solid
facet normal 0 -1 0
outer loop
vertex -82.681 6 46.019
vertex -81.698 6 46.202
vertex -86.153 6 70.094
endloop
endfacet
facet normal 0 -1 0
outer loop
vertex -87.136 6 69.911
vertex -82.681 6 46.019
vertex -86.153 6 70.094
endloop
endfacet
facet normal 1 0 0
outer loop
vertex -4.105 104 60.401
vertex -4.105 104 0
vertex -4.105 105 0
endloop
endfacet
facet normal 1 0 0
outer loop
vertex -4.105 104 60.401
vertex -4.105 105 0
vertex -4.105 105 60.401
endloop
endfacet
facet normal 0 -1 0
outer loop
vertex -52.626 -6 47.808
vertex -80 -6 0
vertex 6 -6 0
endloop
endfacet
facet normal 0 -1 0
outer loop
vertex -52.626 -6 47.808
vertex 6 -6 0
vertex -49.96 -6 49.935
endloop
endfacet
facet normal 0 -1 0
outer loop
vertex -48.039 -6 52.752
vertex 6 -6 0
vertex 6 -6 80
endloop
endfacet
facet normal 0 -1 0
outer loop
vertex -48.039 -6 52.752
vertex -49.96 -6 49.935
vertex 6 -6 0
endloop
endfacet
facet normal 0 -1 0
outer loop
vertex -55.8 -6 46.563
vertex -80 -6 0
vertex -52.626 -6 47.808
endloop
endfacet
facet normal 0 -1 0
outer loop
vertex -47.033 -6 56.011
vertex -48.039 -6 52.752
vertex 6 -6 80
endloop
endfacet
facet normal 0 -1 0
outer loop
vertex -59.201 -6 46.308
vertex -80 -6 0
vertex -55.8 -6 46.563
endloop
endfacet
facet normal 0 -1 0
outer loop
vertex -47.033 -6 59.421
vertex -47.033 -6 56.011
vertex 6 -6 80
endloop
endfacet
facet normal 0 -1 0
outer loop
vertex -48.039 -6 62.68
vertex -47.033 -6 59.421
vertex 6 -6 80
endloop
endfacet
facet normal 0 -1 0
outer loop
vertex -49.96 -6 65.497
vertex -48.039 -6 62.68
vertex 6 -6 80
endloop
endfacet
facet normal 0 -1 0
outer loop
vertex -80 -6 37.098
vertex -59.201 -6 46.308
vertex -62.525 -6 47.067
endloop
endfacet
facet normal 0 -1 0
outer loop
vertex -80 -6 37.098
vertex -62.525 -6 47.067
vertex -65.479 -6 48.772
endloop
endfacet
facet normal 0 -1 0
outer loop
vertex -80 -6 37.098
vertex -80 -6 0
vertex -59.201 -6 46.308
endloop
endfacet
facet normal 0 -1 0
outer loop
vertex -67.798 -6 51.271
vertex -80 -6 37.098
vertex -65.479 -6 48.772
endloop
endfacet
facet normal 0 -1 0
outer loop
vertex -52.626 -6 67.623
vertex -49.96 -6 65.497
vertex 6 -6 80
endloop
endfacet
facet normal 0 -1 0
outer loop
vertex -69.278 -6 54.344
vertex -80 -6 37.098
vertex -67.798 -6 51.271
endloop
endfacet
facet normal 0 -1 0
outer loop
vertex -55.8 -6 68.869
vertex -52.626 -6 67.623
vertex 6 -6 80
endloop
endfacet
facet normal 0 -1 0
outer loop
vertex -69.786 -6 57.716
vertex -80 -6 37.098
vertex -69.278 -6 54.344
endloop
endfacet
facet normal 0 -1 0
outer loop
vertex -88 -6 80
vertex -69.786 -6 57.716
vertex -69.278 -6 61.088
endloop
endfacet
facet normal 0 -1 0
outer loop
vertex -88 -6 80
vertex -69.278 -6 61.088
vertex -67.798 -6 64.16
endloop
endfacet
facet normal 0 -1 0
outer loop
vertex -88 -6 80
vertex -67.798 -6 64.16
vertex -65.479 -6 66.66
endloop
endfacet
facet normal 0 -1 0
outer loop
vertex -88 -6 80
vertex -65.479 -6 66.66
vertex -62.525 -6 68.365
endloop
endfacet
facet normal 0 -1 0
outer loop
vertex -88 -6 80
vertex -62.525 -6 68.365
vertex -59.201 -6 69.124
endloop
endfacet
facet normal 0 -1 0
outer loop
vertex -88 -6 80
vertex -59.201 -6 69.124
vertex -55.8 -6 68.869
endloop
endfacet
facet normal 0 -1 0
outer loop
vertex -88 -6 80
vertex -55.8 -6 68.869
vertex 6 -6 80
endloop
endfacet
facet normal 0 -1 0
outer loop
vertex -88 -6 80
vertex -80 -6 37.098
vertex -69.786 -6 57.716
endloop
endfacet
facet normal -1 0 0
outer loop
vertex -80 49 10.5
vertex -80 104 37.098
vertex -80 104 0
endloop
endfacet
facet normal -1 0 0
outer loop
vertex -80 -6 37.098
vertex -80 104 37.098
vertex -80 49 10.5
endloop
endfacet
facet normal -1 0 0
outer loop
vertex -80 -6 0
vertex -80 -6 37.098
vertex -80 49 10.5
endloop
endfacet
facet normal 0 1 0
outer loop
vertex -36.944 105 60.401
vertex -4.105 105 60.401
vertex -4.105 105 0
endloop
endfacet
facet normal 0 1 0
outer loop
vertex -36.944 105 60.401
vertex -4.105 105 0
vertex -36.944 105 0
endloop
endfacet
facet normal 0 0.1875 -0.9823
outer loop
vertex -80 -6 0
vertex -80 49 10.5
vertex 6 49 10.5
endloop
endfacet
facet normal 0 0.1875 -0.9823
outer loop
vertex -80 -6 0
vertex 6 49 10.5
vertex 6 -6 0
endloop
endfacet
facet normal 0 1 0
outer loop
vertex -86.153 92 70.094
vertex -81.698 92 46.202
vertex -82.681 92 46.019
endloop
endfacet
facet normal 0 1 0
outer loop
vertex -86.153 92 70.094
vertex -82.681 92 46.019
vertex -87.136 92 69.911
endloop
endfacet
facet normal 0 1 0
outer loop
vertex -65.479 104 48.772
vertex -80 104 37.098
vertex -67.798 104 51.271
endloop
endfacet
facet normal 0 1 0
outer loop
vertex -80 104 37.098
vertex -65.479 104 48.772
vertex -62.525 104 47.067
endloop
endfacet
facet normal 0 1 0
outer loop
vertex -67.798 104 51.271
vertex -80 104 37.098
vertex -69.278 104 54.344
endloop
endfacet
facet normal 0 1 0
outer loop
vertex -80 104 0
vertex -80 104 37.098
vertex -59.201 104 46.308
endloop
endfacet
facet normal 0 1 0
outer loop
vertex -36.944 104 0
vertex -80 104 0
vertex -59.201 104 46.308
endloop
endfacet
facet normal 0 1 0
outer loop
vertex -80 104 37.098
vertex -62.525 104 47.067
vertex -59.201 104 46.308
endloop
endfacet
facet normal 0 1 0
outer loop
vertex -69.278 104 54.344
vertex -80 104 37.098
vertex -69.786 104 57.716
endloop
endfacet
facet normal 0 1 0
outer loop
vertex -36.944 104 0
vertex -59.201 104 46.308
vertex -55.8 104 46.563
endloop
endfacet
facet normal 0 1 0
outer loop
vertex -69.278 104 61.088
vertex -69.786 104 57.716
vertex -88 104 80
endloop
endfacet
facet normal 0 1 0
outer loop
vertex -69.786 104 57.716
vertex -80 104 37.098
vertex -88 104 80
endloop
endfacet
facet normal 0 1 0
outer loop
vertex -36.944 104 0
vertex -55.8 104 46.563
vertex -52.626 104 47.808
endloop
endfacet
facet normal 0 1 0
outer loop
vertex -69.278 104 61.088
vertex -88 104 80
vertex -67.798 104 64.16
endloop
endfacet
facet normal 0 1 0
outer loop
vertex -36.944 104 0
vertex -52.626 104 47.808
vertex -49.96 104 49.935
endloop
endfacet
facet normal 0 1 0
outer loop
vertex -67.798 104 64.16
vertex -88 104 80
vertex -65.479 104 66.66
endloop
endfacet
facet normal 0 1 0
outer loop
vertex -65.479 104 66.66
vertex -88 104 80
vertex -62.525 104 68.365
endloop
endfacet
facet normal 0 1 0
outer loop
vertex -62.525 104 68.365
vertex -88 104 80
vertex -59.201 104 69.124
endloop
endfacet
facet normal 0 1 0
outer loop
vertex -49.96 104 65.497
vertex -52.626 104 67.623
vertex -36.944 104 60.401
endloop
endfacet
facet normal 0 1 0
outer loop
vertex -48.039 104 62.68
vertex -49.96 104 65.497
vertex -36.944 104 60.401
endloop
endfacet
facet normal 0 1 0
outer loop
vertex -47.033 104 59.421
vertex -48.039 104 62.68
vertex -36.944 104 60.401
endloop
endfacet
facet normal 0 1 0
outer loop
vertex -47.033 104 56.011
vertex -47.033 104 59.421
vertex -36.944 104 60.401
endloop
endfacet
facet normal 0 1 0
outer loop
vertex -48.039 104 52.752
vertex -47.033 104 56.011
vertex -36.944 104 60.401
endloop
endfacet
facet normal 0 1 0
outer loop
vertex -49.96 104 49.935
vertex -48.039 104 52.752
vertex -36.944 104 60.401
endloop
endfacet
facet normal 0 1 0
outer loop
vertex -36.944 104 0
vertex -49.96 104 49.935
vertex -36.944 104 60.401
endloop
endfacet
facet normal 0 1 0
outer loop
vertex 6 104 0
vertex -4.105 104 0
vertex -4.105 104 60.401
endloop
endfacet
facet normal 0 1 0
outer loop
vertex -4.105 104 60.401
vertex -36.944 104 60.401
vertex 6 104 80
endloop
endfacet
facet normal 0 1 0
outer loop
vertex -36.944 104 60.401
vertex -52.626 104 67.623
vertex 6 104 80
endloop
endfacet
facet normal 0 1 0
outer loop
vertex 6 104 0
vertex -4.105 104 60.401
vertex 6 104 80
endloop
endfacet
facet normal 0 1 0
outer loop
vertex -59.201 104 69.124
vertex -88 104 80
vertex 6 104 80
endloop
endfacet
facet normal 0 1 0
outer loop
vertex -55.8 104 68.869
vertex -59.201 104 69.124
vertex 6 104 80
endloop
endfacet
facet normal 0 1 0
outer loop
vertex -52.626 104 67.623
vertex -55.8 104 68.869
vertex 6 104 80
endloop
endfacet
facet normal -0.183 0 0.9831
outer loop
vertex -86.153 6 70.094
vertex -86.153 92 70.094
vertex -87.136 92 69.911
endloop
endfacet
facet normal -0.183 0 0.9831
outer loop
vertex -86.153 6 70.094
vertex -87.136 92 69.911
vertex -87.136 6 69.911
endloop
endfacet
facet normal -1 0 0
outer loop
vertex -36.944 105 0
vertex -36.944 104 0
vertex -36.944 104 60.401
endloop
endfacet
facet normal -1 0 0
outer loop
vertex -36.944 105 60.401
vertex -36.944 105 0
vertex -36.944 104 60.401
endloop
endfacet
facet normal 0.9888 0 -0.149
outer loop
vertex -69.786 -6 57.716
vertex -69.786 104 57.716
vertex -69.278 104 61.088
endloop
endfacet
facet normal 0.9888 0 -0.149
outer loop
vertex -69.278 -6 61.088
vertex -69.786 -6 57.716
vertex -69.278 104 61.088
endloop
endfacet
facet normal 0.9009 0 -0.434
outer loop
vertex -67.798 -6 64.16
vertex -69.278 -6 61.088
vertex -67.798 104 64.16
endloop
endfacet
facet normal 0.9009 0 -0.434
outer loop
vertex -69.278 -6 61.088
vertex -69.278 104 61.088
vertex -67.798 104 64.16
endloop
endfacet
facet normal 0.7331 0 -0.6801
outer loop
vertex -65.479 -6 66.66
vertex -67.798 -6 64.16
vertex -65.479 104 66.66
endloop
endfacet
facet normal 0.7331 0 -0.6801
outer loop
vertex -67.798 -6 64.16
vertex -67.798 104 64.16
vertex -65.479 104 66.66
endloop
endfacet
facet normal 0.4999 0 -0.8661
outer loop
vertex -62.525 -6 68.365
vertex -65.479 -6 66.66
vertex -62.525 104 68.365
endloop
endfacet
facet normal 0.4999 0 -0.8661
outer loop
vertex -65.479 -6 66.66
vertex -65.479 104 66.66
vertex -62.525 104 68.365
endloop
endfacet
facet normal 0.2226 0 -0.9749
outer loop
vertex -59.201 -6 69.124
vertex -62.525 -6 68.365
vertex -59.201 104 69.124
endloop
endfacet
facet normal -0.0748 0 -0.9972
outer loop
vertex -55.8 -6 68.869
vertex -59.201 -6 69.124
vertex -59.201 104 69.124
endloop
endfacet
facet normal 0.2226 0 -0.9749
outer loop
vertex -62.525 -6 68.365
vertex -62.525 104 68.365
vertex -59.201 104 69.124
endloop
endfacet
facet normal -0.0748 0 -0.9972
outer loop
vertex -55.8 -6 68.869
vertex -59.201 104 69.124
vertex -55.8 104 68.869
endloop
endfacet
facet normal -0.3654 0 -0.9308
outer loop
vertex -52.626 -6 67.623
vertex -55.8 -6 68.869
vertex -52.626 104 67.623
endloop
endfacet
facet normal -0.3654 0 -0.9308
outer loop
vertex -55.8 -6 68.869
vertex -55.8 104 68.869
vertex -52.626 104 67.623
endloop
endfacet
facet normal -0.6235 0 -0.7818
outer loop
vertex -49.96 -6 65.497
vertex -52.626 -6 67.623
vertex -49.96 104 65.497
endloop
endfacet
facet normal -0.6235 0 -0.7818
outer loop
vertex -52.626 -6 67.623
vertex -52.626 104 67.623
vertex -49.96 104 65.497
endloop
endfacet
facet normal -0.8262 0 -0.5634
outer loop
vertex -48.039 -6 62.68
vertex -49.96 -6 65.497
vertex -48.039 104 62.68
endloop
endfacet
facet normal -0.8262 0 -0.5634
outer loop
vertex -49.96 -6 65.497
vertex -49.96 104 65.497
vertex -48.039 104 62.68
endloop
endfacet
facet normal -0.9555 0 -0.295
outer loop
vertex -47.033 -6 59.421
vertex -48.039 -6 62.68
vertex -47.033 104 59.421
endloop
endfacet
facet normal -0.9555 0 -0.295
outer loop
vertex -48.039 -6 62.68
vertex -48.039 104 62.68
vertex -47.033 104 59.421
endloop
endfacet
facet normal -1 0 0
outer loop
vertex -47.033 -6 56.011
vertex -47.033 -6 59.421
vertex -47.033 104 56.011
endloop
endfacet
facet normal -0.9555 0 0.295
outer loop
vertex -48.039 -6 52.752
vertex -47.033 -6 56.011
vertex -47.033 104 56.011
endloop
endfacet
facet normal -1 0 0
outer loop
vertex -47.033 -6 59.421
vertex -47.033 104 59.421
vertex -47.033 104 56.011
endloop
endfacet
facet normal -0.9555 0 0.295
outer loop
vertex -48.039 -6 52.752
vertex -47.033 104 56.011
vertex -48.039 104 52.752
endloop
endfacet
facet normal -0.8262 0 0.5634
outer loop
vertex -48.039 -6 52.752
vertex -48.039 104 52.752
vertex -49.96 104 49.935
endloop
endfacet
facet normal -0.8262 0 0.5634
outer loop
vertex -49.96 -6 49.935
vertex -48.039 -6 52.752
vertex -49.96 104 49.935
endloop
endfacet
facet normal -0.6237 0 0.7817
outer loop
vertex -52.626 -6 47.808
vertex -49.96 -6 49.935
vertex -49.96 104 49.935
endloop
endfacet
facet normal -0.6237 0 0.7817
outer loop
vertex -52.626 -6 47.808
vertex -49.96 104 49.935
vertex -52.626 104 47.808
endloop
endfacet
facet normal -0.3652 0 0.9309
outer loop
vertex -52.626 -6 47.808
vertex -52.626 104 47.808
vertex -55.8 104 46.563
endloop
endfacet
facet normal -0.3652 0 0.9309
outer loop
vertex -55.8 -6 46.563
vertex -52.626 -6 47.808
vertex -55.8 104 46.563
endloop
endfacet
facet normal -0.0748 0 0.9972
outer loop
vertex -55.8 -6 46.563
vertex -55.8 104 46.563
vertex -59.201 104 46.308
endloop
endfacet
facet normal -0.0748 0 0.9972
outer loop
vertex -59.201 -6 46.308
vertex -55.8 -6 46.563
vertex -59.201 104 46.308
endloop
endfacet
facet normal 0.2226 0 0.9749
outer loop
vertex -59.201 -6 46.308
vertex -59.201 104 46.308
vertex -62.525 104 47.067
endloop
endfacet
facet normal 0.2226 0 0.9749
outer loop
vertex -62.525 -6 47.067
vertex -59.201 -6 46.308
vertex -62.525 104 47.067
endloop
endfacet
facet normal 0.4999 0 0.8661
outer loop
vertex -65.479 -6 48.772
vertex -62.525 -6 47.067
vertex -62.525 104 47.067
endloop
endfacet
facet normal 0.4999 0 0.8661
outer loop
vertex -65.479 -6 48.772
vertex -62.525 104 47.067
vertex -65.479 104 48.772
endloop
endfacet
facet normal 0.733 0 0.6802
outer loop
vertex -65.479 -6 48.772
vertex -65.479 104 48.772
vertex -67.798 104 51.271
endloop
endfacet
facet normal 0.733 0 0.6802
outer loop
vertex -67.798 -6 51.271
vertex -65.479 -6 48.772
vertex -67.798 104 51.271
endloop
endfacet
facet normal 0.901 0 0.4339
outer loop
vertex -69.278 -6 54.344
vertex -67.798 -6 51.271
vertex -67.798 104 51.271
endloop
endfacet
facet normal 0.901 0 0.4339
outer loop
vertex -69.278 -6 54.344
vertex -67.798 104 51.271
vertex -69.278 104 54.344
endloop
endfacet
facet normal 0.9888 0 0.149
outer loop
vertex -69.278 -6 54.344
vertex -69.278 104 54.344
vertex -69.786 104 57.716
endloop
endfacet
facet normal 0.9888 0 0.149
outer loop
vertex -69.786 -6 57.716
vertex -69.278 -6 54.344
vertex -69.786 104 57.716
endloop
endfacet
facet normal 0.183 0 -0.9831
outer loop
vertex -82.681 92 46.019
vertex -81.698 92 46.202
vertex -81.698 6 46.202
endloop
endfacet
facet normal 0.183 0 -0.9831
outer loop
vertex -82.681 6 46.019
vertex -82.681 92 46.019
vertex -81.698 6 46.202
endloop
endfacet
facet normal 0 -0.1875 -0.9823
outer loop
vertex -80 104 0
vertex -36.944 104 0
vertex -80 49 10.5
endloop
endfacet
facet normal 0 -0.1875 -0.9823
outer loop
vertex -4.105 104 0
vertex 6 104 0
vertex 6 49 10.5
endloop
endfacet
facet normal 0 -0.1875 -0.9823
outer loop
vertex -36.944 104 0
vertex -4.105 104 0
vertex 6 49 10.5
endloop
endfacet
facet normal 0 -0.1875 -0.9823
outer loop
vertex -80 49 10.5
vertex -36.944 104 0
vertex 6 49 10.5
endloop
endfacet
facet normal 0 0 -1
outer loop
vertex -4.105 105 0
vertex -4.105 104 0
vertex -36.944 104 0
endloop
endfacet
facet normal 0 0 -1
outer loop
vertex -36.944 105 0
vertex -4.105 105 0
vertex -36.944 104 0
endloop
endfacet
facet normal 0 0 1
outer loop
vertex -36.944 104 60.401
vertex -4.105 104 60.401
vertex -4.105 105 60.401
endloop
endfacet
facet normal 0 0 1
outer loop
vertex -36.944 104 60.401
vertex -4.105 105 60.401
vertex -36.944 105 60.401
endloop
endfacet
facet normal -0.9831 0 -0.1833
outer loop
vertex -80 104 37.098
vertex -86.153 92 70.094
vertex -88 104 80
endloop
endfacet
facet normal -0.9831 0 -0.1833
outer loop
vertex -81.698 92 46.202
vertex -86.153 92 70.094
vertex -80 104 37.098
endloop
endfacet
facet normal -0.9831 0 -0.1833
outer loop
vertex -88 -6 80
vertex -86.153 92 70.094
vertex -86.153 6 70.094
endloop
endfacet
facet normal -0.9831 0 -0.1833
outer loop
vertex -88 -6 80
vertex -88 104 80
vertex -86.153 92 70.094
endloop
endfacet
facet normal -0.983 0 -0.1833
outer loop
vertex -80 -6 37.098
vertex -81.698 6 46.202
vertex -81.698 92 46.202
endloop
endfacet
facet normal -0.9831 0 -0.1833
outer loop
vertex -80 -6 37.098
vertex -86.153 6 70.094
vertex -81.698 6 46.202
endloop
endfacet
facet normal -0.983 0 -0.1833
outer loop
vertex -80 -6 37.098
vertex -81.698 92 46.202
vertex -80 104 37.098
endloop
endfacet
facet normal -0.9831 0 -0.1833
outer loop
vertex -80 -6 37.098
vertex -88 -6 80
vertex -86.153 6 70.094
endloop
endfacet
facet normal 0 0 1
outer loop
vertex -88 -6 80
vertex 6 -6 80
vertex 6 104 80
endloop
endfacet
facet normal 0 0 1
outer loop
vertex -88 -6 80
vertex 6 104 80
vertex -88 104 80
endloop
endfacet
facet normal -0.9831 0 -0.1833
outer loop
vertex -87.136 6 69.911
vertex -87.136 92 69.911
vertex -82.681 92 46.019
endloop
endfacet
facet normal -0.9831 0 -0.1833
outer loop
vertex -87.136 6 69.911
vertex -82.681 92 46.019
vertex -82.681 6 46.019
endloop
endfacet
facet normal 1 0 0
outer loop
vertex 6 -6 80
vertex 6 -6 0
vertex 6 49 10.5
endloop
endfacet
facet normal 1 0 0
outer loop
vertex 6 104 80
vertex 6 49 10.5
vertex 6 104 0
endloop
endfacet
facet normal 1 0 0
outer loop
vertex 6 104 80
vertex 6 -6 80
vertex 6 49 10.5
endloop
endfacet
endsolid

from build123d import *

# Parameters (mm, degrees)
F1_DEPTH  = 6
F2_W      = 104
F2_H      = 80
F2_W_2    = 6
F3_DEPTH  = 6
F5_DEPTH  = 104
F7_DEPTH  = 200
F8_R      = 11.4401294272
F10_DEPTH = 200
F11_W     = 86
F11_H     = 24.3039056659
F12_DEPTH = 1
F13_W     = 32.8389904462
F13_H     = 60.4005604982
F14_DEPTH = 1


with BuildPart() as f1:
    # F0 (on Front) → F1 (new body)
    with BuildSketch(Plane.XZ):
        Polygon((-88, 80), (-80, 37.097658962), (-80, 80), align=None)
        Polygon((-80, 0), (0, 0), (0, 80), (-80, 80), (-80, 37.097658962), align=None)
    extrude(amount=F1_DEPTH)

    # F2 (on face) → F3 (join)
    with BuildSketch(Plane.YZ):
        with Locations((52, 40)):
            Rectangle(F2_W, F2_H)
        with Locations((-3, 40)):
            Rectangle(F2_W_2, F2_H)
    extrude(amount=F3_DEPTH)

    # F5 (add, through all): a face of the model
    f5_faces = [f1.faces().sort_by_distance(p)[0] for p in [
        (-41.1141866674, 0, 40.6711029977),
    ]]
    extrude(f5_faces, amount=F5_DEPTH)

    # F6 (on face) → F7 (cut)
    with BuildSketch(Plane.YZ.offset(6)):
        Polygon((104, 0), (49, 10.5), (-6, 0), align=None)
    extrude(amount=-F7_DEPTH, mode=Mode.SUBTRACT)

    # F8 (on face) → F10 (cut)
    with BuildSketch(Plane(origin=(0, 104, 0), x_dir=(-1, 0, 0), z_dir=(0, 1, 0))):
        with Locations((58.3457089961, 57.7158816159)):
            Circle(F8_R)
    extrude(amount=-F10_DEPTH, mode=Mode.SUBTRACT)

    # F11 (on face) → F12 (join)
    with BuildSketch(Plane(origin=(-70.6266357892, 0, -13.1697495438), x_dir=(0, -1, 0), z_dir=(-0.983055103, 0, -0.1833102957))):
        with Locations((-49, 72.5469328463)):
            Rectangle(F11_W, F11_H)
    extrude(amount=F12_DEPTH)

    # F13 (on face) → F14 (join)
    with BuildSketch(Plane(origin=(0, 104, 0), x_dir=(-1, 0, 0), z_dir=(0, 1, 0))):
        with Locations((20.5245364923, 30.2002802491)):
            Rectangle(F13_W, F13_H)
    extrude(amount=F14_DEPTH)


solid = f1.part
